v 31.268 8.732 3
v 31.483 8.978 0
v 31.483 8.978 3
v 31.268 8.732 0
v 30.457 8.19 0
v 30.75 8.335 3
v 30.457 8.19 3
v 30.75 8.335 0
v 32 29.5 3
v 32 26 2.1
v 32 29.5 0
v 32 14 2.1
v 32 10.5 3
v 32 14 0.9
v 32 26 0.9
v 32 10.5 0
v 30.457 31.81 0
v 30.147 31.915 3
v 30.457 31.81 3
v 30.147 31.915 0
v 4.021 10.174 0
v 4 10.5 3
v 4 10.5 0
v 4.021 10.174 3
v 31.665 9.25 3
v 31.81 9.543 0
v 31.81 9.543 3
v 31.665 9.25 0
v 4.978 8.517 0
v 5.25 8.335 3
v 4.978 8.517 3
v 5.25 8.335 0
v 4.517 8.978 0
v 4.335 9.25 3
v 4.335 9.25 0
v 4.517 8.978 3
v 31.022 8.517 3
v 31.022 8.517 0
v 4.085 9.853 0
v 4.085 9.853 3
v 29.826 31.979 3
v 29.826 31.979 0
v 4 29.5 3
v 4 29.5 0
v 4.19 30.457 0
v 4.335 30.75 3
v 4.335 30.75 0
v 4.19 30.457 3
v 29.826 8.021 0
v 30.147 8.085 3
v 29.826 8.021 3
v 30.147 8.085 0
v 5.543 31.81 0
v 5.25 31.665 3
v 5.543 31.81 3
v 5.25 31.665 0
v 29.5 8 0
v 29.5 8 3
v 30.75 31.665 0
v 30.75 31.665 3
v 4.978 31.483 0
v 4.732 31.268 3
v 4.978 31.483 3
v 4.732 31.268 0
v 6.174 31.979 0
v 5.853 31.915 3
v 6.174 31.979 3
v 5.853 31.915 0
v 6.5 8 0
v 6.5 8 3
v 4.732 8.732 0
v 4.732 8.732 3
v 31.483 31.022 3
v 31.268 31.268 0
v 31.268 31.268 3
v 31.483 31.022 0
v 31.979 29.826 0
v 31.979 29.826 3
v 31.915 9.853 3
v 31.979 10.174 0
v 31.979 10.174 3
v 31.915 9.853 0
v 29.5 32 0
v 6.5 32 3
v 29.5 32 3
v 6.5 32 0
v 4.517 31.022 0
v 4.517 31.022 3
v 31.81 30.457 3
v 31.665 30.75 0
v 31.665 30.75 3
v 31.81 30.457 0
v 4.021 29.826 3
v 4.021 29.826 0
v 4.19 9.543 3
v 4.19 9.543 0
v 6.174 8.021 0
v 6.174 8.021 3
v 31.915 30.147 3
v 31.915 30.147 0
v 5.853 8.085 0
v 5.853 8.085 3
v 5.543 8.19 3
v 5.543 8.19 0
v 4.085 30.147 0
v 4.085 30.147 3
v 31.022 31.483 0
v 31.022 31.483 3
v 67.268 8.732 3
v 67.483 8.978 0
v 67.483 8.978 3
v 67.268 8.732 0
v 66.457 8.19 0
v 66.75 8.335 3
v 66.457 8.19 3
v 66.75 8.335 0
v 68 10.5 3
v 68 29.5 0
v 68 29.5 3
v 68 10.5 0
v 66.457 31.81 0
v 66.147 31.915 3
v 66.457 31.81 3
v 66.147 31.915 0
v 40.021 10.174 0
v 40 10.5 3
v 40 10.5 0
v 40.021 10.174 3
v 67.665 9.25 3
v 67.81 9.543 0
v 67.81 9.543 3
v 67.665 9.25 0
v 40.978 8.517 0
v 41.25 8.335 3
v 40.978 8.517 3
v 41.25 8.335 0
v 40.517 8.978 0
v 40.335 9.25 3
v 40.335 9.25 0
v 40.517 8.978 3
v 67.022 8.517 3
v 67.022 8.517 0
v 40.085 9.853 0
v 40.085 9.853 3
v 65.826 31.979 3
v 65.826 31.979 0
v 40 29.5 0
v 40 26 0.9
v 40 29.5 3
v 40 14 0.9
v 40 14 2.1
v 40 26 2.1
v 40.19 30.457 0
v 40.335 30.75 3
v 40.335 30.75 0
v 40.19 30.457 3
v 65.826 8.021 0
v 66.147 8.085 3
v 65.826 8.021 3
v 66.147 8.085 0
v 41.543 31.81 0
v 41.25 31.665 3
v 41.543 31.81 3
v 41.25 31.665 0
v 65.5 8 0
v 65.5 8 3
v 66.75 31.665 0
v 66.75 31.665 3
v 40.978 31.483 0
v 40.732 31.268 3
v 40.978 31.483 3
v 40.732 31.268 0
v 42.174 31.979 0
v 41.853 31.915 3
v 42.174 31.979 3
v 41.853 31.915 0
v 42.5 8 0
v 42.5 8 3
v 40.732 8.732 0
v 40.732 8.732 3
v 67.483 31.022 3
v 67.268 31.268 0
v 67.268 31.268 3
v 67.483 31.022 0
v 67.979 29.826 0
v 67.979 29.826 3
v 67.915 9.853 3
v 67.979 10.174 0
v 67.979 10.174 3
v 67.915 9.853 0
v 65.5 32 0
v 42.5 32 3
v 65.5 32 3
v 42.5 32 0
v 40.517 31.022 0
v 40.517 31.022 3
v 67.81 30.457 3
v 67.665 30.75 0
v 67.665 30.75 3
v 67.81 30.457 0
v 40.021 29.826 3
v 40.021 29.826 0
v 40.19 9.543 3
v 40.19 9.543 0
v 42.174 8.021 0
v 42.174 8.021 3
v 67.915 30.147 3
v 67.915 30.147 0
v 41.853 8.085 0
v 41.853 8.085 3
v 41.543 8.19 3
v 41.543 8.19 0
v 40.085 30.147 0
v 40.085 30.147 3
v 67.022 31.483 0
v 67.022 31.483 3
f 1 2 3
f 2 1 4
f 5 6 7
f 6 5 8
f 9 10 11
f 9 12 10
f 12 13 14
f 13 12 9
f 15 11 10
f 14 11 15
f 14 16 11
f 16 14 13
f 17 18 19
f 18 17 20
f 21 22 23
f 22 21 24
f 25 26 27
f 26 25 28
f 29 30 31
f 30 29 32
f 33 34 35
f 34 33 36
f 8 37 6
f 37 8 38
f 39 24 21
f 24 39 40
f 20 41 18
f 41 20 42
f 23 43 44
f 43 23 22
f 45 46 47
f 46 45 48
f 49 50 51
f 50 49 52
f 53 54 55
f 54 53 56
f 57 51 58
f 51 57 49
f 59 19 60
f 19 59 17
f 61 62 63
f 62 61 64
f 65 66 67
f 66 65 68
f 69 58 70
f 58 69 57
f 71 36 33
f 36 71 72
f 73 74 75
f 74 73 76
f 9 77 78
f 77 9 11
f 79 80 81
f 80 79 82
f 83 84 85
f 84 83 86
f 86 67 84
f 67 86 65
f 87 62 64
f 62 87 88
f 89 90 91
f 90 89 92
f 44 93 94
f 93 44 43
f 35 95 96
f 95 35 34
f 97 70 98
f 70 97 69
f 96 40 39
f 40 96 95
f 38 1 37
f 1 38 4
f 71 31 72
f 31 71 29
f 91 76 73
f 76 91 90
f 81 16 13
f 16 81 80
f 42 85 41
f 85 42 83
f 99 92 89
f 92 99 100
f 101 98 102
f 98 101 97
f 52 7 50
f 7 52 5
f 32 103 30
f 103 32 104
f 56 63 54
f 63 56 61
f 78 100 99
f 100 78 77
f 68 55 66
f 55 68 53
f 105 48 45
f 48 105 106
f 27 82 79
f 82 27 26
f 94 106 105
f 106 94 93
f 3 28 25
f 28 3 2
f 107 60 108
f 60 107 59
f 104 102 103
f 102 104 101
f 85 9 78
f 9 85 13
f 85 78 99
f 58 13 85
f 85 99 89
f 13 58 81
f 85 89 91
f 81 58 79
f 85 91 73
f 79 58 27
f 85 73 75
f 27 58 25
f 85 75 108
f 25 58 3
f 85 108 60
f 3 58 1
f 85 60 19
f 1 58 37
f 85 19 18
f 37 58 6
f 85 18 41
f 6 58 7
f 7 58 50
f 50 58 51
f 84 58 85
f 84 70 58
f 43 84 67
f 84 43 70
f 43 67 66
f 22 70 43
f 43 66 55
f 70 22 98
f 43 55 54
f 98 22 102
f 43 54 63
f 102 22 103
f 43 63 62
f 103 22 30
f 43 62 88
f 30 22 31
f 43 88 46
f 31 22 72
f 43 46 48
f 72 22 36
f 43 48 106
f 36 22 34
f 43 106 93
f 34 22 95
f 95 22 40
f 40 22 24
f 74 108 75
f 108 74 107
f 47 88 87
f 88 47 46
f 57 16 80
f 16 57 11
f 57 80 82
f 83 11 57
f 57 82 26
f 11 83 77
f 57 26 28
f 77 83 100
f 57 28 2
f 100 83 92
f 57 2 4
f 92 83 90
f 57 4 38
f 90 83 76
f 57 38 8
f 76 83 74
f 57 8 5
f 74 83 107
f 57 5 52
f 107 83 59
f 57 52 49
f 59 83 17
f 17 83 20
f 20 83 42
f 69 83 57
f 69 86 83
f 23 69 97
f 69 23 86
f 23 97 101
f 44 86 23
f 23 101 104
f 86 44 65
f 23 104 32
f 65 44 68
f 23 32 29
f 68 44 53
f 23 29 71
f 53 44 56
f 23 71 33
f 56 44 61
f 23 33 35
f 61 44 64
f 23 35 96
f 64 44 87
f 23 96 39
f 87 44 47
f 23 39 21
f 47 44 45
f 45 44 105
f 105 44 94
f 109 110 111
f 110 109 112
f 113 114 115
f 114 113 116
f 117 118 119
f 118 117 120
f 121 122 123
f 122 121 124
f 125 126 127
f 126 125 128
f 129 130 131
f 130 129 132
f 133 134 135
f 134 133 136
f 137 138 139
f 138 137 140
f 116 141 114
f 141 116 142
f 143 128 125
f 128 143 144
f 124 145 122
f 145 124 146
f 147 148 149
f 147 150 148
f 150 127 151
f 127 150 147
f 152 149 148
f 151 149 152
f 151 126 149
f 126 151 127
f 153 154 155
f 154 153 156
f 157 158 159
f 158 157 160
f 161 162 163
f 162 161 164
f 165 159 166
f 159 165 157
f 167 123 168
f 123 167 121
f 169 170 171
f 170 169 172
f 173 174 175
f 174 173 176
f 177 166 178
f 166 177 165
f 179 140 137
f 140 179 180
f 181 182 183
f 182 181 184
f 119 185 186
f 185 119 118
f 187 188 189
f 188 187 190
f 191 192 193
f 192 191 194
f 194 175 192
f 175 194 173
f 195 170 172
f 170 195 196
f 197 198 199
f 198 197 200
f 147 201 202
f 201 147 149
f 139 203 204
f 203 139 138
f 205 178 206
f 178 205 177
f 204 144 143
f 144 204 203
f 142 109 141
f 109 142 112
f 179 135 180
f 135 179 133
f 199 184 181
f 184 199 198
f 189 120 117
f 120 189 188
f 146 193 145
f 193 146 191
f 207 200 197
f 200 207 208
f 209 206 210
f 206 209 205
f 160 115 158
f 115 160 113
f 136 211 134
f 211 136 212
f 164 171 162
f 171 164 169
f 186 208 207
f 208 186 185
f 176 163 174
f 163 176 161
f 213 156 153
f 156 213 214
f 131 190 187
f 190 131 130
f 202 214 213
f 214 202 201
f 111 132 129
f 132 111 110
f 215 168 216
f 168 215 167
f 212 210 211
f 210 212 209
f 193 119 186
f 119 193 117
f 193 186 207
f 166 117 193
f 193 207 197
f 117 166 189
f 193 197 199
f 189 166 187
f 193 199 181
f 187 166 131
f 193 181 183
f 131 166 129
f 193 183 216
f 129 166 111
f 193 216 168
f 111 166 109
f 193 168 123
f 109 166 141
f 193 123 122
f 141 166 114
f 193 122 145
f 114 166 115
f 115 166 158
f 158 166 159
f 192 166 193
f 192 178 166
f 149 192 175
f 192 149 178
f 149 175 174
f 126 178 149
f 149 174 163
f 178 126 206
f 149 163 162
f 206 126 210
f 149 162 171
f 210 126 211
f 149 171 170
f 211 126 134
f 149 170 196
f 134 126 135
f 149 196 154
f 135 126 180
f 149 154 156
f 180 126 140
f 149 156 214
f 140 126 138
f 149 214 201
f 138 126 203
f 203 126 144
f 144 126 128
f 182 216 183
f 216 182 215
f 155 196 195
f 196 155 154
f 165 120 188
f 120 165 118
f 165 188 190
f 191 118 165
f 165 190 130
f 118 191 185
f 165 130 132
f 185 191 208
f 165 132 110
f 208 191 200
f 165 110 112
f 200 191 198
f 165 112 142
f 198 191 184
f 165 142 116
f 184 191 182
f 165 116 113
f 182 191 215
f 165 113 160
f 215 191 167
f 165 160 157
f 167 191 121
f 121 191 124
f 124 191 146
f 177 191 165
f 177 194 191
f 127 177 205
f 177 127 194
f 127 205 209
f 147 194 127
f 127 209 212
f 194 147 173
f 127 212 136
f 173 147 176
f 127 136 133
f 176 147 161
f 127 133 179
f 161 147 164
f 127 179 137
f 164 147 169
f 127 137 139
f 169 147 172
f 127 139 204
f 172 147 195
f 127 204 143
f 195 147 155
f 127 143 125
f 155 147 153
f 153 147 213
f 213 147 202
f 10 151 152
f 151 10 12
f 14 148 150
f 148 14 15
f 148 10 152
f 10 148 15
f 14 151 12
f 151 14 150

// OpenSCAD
/*
Sample 012: Dünnsteg-Festkörpergelenk — kräftig 1,2 mm
Generated from the FDM Mechanical Sample Library.
Units: millimetres.

Override examples:
  openscad -o custom.stl -D 'view="plate"' -D 'render_fn=64' model.scad
  openscad -o preview.png -D 'view="assembly"' model.scad
*/
use <../../../library/fdm_mechanisms.scad>

render_fn = is_undef(render_fn) ? 48 : render_fn;
view = is_undef(view) ? "plate" : view;
$fn = render_fn;

sample_flexure_hinge(
    view=view,
    beam_t=1.2,
    beam_w=12,
    gap=8
);
